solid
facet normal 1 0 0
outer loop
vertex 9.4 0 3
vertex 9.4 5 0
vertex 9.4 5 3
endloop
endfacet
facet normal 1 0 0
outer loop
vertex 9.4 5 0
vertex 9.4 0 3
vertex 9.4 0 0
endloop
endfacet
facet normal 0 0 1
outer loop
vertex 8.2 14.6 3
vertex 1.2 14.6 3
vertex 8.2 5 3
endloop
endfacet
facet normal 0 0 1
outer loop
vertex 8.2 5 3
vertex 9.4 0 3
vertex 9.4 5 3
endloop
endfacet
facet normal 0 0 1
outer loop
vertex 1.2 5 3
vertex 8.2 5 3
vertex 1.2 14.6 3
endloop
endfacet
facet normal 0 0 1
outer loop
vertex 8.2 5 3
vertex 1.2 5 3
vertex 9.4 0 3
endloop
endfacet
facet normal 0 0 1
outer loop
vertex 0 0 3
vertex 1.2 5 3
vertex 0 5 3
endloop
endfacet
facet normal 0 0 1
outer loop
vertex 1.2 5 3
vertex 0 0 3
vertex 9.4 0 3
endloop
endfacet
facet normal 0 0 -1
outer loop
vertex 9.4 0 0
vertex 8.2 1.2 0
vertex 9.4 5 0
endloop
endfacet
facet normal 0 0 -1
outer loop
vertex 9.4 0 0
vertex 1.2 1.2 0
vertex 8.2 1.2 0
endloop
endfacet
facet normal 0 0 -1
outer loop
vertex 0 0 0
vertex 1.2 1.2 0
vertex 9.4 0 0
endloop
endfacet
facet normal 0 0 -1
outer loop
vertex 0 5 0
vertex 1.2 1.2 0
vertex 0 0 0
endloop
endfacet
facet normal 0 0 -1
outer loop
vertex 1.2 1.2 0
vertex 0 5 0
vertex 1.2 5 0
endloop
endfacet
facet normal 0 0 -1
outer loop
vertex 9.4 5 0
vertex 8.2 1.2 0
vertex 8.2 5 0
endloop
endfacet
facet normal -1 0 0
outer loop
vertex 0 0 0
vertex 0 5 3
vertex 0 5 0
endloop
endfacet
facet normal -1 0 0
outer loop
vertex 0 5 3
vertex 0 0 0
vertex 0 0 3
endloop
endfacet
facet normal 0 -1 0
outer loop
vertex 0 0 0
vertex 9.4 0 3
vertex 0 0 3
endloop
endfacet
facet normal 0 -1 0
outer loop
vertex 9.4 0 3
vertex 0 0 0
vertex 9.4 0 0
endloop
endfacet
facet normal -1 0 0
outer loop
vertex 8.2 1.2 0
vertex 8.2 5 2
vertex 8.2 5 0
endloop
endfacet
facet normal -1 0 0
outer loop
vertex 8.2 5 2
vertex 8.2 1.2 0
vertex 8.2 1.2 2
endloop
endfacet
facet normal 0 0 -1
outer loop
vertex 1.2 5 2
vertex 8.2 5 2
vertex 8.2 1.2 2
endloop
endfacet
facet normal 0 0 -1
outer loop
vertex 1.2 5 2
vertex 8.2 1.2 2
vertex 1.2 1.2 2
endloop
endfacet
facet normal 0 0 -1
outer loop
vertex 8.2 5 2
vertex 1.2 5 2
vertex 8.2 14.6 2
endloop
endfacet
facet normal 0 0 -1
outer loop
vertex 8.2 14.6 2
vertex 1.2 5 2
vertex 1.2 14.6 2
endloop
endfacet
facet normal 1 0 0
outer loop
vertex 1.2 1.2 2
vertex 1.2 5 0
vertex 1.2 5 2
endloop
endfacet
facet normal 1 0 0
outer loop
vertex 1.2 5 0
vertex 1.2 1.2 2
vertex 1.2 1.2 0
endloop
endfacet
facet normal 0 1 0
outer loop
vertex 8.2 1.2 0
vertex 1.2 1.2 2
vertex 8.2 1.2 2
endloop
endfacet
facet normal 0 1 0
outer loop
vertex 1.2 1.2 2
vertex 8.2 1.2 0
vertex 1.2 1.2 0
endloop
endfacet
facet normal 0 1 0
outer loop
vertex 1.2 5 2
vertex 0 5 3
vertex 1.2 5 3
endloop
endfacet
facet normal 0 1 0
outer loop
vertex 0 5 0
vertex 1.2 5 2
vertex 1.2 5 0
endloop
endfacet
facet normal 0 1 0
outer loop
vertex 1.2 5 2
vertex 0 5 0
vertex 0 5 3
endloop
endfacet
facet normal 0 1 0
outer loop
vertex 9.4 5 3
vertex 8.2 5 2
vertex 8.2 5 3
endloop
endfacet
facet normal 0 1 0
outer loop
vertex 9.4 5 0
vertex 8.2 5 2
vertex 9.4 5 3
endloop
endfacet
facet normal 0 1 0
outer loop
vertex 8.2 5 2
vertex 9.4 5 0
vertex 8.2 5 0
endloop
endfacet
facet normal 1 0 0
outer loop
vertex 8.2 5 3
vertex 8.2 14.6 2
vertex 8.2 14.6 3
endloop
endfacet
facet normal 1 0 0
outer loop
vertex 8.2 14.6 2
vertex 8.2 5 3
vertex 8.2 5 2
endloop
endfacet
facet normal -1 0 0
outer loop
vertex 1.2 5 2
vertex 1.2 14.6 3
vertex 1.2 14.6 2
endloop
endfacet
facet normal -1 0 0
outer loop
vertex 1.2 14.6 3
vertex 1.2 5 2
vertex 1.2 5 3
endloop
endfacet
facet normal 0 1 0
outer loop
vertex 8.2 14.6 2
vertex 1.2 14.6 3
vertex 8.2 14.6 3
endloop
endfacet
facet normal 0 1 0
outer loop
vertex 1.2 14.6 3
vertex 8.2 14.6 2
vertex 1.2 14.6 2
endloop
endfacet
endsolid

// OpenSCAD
use <hggh/usb_c_breakout_case_holder.scad>
include <BOSL/constants.scad>
use <BOSL/metric_screws.scad>

$fn=190;

SIZE_X_OUTSIDE = 130;
SIDE_Y_OUTSIDE = 82;
SIZE_Z = 35-1.2;


module akku() {
    cube([75, 20, 20]);
}





module switch() {
    translate([6, 0, 0])
    rotate([0, 180, 0]) {
    difference() {
        cube([6, 20, 1]);
        
        translate([3, 2.5, 0]) cylinder(d=2-0.2, h=10);
        translate([3, 2.5+15, 0]) cylinder(d=2-0.2, h=10);
    }
    translate([0, 4, -16]) cube([6, 12, 16]);
    translate([0.5, 7, 1]) cube([5, 6, 5]);
    }
}

module case() {
    difference() {
        translate([SIZE_X_OUTSIDE/2, SIDE_Y_OUTSIDE/2, 0]) {
            linear_extrude(35) {
                resize([SIZE_X_OUTSIDE, SIDE_Y_OUTSIDE]) { 
                    circle(d=SIZE_X_OUTSIDE);
                }
            }
        }
    
        translate([(SIZE_X_OUTSIDE)/2, (SIDE_Y_OUTSIDE)/2, -1]) {
            linear_extrude(SIZE_Z + 1) {
                resize([SIZE_X_OUTSIDE-4, SIDE_Y_OUTSIDE-4]) { 
                    circle(d=SIZE_X_OUTSIDE);
                }
            }
        }
    
        //Schrauben
        translate([7.3, 38.250, -1]) {
            cube([5.5, 5.5, 50]);
        }
        translate([117.200, 38.25, -1]) {
            cube([5.5, 5.5, 50]);
        }
    
        // Display
        translate([49.6, 51, 0]) {
            cube([30.9, 14.5, 50]);
        }
    
        // Button left
        translate([30.6, 24.950, 0]) {
            cylinder(d=16.3, h=50);
        }
    
        // KY-040
        translate([99.4, 24.950, 0]) {
            cylinder(d=7.5, h=50);
        }
        //usb c connector
        translate([57.500, 0, 2.750]) {
            cube([15, 20,  9]);
        }
    }

    // lid stand left, right
    translate([2+1, SIDE_Y_OUTSIDE/2, 2]) {
        hull() {
            cylinder(d=2, h=SIZE_Z-0.8);
            translate([-1, 0, 0]) cylinder(d=2, h=SIZE_Z-0.8);
        }
    }
    translate([SIZE_X_OUTSIDE-2-1, SIDE_Y_OUTSIDE/2, 2]) {
        hull() {
            cylinder(d=2, h=SIZE_Z-0.8);
            translate([1, 0, 0]) cylinder(d=2, h=SIZE_Z-0.8);
        }
    }

    //lid stand top
    difference() {
        union() {
            translate([65, 78, 2]) {
                linear_extrude(SIZE_Z-.8) {
                    resize([37.187, 5.808]) { 
                        circle(d=37.187);
                    }
                }
            }
            translate([48.539, 71.810, 2]) {
                cube([32.923, 6.380, SIZE_Z-.8]);
            }
        }
        translate([55, 71+6, 4.9]) {
            rotate([0,0, 270])
            switch();
        }
        translate([55, 71, 0]) {
            cube([20, 6, 4]);
        }
    }

    // lid stand bottom
    translate([35.419, 8.615, 2]) {
        cylinder(d=7, h=SIZE_Z-0.8);
    }

    translate([89.837, 6.877, 2]) {
        cylinder(d=7, h=SIZE_Z-0.8);
    }


    // mutter holder
    translate([7.870, 49.084, 2]) {
        mutter_holder();
    }
    translate([SIZE_X_OUTSIDE-7.870, 49.084+10.080, 2]) {
        rotate([0, 0, 180])mutter_holder();
    }
    translate([99.4 - (16/2), 24.950 - (16/2), SIZE_Z - 4]) {
    difference() {
        cube([16, 16, 4]);
        translate([1.5, 1.5, -1]) cube([13, 13, 5]);
    }
}

//stand for battery holder
translate([28.6, 51.550, SIZE_Z-(12-1.2)]) {
    cube([9, 15, 12-1.2]);
}
translate([92.4, 51.550, SIZE_Z-(12-1.2)]) {
    cube([9, 15, 12-1.2]);
}
}


module mutter_holder() {
    difference() {
        cube([7.5, 10.08, SIZE_Z-0.8]);
        translate([7.5/2, 10.08/2, -1]) cylinder(d=3.25, h=50);
        
        translate([0, 2.2900-0.05, 4]) cube([12, 5.5+0.1, 3]);
    }
}



module lid() {
    difference() {
        union() {
            translate([SIZE_X_OUTSIDE/2, SIDE_Y_OUTSIDE/2, 0]) {
                linear_extrude(1.6) {
                    resize([SIZE_X_OUTSIDE-4-0.7, SIDE_Y_OUTSIDE-4-0.7]) { 
                        circle(d=SIZE_X_OUTSIDE);
                    }
                }
                
            }
            // PCB Holder
            translate([55, 2.9, 1.6]) {
                cube([20, 11, 12]);
            }
            translate([52, 3.4, 1.6]) {
                cube([3, 3, 12]);
            }
            //left notch
            translate([16.370, 39.164, 1.6]) {
                cube([7, 11+2.4, 5.3]);
            }
            //right notch
            translate([SIZE_X_OUTSIDE-7-16.370, 39.164, 1.6]) {
                cube([7, 11+2.4, 5.3]);
            }
        }
        translate([55, 2.9, 1.6+2+0.1]) {
            pcb();
        }
        translate([55, 5, 4]) cube([30, 30, 30]);
        //left notch
        translate([17.720, 39.164+1.2, 1.6]) {
            cube([4.3, 11, 30]);
            translate([0, 0, -2]) {
                cube([4.3, 5.3, 2.6]);
            }
        }
        //right notch
        translate([SIZE_X_OUTSIDE-4.3-17.720, 39.164+1.2, 1.6]) {
            cube([4.3, 11, 30]);
            translate([0, 0, -2]) {
                cube([4.3, 5.3, 2.6]);
            }
        }

        // screws
        translate([11.620, 54.124, -1]) {
            cylinder(d=3.2, h=10);
        }
        translate([SIZE_X_OUTSIDE-11.620, 54.124, -1]) {
            cylinder(d=3.2, h=10);
        }
        
        // on/off switch
        translate([61, 72.250, -1]) {
            cube([8, 3.5, 10]);
        }
    }
}

module notch_lid() {
    
    difference() {
        cube([7+2.4, 11+2.4+1.2, 3]);
        translate([1.2, 1.2, 0])cube([7, 11+2.4, 2]);
        
        translate([0, 5, 0]) cube([50, 50, 50]);
    }
    translate([1.2, 0, 2]) cube([7, 11+2.4+1.2, 1]);
}

translate([0, 0, -30]) {
    //case();
}


translate([0, 0, -50]) {
   //lid();
}

notch_lid();
